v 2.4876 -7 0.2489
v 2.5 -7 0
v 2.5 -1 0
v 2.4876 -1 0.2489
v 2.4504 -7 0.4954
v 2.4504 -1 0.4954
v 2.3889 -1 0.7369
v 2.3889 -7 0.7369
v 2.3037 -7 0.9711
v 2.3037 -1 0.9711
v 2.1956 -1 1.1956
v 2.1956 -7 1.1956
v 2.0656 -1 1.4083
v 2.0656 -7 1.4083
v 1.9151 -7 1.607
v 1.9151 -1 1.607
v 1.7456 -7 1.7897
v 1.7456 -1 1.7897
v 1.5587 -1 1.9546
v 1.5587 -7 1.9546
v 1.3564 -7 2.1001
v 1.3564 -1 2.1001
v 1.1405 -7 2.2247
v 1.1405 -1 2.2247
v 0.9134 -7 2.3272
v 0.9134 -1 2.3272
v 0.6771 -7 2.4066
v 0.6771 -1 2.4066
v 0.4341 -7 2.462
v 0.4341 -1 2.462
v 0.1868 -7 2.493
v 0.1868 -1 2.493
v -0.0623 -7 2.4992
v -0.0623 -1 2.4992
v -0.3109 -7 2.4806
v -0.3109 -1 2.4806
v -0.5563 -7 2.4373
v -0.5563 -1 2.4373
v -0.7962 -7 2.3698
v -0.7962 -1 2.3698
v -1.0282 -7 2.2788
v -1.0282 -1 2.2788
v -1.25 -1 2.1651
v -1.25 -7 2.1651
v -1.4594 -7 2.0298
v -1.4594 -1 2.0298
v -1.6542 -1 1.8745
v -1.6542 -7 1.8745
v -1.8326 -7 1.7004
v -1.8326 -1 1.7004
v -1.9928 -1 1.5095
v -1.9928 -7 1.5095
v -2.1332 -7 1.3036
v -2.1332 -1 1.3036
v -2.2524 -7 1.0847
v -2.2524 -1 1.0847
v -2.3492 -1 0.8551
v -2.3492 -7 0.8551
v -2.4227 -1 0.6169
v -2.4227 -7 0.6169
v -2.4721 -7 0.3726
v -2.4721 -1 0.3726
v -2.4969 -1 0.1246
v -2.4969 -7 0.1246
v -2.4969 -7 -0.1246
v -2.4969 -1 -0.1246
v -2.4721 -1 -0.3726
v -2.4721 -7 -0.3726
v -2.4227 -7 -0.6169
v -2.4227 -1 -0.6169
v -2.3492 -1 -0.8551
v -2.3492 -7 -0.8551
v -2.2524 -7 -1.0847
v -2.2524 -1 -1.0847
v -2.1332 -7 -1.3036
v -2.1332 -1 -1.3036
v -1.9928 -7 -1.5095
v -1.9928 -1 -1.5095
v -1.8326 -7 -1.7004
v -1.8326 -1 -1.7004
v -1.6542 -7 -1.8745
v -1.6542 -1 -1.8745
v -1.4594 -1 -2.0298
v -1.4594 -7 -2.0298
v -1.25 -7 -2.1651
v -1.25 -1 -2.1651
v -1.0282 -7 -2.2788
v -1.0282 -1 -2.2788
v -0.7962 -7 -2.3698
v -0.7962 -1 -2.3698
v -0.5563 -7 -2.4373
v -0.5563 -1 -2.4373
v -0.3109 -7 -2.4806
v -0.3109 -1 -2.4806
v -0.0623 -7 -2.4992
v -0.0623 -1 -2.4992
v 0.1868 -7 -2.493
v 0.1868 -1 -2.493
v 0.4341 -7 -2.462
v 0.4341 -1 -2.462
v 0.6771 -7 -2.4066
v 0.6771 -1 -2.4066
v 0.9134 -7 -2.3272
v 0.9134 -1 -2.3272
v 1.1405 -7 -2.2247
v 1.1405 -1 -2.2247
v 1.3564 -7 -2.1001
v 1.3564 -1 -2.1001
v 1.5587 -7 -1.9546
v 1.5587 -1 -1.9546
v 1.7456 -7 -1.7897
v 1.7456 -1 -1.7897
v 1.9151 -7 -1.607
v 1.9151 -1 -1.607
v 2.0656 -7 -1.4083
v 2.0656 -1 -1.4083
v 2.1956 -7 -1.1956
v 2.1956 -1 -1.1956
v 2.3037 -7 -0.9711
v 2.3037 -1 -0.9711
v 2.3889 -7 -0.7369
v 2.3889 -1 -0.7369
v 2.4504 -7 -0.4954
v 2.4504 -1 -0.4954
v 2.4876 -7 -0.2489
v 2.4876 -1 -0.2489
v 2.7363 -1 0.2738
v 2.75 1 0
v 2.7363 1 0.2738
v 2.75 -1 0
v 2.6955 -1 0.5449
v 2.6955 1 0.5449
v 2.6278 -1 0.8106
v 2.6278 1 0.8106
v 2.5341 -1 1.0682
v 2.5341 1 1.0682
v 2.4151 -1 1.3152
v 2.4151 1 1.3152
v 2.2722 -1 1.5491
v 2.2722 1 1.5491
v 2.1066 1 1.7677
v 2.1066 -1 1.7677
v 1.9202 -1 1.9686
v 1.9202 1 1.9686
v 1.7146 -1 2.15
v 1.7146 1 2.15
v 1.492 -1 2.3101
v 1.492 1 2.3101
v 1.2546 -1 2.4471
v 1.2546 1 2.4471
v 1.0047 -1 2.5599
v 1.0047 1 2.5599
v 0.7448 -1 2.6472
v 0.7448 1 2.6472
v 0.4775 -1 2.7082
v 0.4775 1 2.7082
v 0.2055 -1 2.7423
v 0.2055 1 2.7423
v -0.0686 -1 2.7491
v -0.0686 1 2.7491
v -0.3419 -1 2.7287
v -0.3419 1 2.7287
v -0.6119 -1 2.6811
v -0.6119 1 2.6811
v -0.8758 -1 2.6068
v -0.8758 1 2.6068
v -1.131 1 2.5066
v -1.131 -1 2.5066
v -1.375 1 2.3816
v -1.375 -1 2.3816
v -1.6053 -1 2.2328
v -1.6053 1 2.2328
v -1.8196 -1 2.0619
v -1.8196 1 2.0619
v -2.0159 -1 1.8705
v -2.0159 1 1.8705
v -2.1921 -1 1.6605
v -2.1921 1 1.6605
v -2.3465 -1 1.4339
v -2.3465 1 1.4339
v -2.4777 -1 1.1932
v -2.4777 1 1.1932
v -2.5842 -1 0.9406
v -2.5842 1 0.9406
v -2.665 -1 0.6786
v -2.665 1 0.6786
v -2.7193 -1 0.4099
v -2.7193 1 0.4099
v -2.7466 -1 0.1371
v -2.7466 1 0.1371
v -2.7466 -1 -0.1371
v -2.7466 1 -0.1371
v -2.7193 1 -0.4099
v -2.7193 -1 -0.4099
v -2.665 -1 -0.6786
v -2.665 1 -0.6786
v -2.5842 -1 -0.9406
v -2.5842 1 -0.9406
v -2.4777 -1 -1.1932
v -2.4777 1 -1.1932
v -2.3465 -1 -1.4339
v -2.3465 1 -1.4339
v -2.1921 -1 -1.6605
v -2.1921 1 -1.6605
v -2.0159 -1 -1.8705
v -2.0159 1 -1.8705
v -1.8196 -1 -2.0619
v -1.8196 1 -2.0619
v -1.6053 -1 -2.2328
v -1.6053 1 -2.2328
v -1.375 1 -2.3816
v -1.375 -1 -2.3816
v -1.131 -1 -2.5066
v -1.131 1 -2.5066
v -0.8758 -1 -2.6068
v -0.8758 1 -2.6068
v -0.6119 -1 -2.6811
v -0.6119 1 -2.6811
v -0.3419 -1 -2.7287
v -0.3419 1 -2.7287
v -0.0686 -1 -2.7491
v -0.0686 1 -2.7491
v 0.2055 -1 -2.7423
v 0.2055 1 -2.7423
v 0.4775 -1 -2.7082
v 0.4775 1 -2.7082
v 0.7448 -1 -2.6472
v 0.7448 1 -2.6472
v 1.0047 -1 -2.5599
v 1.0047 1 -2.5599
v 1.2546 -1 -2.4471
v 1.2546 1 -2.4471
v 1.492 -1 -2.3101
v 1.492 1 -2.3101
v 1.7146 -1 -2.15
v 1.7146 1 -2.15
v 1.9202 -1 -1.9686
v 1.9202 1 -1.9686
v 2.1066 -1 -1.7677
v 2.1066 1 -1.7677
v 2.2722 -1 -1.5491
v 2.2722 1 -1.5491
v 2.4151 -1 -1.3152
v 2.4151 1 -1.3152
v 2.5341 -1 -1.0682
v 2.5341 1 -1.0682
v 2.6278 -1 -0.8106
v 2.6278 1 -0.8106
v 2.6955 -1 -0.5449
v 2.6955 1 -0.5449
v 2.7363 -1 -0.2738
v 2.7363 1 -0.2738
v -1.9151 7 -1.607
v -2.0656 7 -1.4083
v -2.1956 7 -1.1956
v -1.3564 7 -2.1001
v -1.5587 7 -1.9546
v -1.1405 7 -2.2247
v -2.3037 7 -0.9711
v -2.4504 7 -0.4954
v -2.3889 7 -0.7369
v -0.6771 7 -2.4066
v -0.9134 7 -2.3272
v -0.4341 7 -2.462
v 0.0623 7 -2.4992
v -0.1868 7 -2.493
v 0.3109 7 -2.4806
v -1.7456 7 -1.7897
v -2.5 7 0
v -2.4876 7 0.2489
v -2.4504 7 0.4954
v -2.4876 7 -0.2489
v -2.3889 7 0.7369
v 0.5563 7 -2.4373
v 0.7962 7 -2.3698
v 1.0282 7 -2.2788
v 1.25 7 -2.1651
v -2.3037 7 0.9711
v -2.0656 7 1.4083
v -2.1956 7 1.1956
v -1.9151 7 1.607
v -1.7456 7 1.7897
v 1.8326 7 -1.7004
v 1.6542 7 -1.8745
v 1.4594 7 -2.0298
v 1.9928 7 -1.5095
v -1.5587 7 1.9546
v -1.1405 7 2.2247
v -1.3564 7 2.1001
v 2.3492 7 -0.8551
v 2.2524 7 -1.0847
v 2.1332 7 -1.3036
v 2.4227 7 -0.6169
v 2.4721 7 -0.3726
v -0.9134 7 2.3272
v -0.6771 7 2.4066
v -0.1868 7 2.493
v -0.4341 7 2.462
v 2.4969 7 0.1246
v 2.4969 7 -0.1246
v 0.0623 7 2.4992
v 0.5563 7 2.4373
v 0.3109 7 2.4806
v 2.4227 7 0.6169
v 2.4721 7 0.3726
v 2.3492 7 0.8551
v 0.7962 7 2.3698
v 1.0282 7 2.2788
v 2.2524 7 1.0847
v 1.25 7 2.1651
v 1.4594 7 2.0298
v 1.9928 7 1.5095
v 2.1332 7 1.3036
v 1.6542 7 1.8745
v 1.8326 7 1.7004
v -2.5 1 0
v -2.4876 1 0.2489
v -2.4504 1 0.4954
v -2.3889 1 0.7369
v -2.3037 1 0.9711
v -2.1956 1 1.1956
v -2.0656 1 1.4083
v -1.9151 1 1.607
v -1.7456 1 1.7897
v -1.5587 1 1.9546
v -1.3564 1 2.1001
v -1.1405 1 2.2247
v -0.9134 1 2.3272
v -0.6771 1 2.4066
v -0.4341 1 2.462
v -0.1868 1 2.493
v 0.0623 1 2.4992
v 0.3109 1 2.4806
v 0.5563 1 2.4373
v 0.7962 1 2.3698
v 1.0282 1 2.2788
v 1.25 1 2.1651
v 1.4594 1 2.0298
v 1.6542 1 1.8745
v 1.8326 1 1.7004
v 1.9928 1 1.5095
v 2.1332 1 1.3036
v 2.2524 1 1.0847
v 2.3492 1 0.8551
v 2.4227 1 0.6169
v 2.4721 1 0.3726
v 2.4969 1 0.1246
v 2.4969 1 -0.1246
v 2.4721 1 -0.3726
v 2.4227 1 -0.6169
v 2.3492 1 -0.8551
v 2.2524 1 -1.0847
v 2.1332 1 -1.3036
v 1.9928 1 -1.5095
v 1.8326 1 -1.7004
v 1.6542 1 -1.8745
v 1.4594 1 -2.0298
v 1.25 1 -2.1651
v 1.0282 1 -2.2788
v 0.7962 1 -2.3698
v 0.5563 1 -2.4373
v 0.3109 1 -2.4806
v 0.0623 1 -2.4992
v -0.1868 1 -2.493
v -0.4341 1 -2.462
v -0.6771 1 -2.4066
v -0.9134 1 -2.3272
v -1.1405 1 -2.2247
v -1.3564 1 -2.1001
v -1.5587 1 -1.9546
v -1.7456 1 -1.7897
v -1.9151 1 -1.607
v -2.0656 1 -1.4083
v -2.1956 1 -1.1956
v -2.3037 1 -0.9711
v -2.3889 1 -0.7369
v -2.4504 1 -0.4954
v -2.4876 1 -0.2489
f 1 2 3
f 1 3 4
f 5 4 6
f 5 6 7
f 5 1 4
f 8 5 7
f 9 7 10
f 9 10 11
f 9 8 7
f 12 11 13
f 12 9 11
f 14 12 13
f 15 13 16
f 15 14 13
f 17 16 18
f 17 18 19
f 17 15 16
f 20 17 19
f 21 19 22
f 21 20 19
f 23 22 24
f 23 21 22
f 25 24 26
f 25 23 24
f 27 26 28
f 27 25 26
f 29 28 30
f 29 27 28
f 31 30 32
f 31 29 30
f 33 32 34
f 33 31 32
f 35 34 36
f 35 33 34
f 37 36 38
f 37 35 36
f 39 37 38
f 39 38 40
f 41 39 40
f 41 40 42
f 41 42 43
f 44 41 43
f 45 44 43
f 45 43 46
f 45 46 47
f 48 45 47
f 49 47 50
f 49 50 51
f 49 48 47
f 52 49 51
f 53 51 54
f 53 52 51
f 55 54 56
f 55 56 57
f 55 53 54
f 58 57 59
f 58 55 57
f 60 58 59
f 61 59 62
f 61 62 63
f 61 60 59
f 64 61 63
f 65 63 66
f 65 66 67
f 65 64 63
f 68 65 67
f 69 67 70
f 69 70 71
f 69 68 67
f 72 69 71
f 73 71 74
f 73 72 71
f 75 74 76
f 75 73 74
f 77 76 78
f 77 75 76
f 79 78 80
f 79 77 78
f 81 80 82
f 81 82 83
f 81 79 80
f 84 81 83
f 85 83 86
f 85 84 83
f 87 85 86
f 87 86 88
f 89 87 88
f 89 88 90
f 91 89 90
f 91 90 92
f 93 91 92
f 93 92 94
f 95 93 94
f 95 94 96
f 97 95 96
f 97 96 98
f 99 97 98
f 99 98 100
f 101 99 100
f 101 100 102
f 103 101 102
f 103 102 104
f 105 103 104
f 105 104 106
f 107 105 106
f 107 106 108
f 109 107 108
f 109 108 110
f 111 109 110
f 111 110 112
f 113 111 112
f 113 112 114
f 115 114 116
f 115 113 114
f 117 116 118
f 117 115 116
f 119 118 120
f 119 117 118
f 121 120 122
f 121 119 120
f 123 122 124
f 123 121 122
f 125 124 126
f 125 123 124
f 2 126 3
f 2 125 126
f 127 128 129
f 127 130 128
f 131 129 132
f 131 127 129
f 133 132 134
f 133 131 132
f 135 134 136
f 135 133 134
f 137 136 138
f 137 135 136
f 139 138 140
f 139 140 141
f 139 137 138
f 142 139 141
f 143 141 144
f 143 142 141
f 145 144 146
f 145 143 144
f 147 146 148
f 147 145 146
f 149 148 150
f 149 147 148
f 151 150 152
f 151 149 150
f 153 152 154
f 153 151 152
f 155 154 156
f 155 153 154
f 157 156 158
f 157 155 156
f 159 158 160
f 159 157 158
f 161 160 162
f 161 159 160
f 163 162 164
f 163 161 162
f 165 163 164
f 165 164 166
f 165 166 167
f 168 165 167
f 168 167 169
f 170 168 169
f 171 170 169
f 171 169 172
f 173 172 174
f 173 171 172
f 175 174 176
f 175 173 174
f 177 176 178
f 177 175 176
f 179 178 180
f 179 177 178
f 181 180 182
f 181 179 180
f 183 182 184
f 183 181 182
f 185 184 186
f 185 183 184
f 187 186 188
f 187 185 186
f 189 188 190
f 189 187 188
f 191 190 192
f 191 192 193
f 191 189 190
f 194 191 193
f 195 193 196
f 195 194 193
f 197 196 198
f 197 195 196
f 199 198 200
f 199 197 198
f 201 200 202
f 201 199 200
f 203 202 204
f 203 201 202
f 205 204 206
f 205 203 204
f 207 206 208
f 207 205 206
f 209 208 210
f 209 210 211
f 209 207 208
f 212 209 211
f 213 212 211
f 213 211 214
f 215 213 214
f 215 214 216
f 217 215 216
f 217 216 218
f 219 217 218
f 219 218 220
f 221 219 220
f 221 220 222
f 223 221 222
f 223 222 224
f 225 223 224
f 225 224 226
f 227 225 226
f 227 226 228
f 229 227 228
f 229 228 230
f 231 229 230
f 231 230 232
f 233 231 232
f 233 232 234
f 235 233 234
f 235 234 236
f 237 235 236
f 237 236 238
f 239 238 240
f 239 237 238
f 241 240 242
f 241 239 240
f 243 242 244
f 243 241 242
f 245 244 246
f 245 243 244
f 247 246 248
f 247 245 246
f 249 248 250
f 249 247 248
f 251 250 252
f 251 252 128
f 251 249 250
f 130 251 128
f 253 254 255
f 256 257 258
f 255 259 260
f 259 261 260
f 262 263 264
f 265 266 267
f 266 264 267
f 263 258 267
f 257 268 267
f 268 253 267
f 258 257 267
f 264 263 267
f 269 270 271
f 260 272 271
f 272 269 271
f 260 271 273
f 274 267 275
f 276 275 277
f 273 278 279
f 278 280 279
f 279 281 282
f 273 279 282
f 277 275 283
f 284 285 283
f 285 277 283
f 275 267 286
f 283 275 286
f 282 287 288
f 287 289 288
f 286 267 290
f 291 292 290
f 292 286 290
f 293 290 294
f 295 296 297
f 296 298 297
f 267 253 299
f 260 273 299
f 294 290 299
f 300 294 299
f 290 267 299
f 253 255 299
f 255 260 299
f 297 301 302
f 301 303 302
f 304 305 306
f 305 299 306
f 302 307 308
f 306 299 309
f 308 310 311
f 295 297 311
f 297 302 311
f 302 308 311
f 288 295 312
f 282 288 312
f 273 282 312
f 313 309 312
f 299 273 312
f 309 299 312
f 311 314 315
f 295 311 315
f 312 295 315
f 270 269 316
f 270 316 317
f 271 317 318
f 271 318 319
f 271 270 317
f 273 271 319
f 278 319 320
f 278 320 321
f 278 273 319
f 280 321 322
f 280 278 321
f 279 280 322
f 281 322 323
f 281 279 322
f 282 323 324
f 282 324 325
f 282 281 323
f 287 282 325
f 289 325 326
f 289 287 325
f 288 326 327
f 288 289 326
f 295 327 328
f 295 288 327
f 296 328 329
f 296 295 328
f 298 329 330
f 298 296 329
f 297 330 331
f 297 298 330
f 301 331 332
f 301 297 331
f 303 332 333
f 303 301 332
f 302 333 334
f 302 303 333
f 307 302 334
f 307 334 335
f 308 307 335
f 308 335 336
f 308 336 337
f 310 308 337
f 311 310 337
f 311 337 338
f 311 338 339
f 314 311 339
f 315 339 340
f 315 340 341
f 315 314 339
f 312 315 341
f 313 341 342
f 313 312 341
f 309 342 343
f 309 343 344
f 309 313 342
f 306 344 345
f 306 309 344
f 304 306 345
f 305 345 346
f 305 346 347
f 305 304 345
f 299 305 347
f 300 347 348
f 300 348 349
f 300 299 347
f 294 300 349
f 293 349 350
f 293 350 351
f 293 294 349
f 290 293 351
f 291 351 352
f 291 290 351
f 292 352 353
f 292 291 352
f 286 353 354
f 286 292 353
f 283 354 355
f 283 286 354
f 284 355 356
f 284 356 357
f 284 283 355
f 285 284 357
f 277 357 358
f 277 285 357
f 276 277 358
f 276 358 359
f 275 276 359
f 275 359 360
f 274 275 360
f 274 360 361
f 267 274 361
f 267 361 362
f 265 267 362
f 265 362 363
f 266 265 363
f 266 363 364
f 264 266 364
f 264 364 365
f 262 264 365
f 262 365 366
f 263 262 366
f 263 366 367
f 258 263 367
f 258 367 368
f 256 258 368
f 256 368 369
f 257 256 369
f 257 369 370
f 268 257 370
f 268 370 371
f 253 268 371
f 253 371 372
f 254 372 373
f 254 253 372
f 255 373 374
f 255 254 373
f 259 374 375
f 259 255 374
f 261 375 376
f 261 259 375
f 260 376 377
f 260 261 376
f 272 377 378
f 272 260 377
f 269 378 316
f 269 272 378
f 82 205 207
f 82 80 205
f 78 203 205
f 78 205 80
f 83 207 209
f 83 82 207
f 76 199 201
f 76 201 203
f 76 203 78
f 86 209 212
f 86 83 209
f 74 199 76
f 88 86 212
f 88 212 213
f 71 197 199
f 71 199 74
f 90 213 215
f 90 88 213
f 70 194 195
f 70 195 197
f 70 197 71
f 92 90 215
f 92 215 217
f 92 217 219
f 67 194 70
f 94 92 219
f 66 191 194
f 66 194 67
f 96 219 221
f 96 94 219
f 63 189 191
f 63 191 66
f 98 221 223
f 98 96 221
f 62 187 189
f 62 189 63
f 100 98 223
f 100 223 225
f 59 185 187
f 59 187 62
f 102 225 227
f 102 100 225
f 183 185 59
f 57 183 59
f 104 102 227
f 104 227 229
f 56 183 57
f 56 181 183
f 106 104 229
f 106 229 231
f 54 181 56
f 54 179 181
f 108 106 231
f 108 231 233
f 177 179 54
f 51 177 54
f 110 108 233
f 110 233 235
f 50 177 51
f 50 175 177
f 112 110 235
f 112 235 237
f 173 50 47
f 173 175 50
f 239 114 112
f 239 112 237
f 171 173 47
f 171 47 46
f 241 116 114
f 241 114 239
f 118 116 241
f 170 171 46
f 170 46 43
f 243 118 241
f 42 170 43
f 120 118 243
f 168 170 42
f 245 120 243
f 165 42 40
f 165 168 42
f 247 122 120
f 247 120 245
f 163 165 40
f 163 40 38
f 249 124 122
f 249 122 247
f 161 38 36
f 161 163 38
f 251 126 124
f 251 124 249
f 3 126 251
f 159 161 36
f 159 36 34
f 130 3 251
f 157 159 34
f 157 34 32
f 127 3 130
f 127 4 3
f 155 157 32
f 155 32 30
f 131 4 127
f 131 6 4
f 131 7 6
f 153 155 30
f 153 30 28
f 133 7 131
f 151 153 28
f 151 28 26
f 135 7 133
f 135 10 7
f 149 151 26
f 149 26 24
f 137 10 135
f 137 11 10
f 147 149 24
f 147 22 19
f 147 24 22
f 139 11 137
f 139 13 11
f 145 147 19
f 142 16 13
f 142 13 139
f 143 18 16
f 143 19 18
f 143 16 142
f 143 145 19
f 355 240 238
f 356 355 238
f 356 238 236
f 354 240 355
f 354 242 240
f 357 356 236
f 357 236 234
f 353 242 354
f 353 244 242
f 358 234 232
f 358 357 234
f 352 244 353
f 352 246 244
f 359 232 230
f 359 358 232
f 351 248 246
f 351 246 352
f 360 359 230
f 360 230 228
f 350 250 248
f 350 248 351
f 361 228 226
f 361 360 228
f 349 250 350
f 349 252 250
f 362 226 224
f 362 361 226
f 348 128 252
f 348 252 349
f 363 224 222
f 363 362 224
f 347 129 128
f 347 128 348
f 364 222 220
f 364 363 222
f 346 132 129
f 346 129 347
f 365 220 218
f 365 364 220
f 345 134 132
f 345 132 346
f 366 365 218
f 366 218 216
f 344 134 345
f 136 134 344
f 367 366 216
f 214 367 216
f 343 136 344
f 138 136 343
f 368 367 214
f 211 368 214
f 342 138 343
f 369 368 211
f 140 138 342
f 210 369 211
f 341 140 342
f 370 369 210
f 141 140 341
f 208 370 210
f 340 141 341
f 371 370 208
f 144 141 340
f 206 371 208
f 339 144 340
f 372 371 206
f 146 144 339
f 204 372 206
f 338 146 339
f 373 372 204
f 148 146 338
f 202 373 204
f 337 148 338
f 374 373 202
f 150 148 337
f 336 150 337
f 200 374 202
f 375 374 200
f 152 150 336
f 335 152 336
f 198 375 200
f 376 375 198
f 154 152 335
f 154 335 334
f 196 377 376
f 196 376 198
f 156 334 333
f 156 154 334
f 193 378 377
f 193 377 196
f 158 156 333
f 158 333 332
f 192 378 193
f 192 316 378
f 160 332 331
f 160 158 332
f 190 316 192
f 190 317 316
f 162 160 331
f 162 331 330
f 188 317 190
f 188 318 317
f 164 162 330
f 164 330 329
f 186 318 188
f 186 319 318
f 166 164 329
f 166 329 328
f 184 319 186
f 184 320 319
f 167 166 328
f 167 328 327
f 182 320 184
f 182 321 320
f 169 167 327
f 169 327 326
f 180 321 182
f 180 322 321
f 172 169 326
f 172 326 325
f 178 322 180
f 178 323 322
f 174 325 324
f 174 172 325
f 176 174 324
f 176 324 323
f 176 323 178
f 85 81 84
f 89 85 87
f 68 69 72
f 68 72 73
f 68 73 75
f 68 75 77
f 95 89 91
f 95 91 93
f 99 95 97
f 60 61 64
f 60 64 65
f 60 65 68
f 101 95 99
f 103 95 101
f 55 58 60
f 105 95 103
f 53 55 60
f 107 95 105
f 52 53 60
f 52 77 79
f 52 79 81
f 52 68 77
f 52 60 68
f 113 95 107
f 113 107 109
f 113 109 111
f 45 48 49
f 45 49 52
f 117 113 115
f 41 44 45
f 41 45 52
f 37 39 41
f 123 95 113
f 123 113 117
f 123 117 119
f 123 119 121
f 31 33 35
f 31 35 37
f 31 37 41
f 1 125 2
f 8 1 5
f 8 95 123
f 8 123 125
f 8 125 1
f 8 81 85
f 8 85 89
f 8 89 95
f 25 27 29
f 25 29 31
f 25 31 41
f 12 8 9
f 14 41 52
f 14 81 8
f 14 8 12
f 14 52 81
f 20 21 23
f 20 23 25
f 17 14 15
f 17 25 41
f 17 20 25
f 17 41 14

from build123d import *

# Parameters (mm, degrees)
F0_R     = 2.75
F1_DEPTH = 7
F2_R     = 2.75
F2_R_2   = 2.5
F3_DEPTH = 6
F4_R     = 2.75
F4_R_2   = 2.5
F5_DEPTH = 6


with BuildPart() as f1:
    # F0 (on Front) → F1 (new body, symmetric)
    with BuildSketch(Plane.XZ):
        Circle(F0_R)
    extrude(amount=F1_DEPTH, both=True)

    # F2 (on face) → F3 (cut)
    with BuildSketch(Plane.XZ.offset(7)):
        Circle(F2_R)
        Circle(F2_R_2, mode=Mode.SUBTRACT)
    extrude(amount=-F3_DEPTH, mode=Mode.SUBTRACT)

    # F4 (on face) → F5 (cut)
    with BuildSketch(Plane(origin=(0, 7, 0), x_dir=(-1, 0, 0), z_dir=(0, 1, 0))):
        Circle(F4_R)
        Circle(F4_R_2, mode=Mode.SUBTRACT)
    extrude(amount=-F5_DEPTH, mode=Mode.SUBTRACT)


solid = f1.part
